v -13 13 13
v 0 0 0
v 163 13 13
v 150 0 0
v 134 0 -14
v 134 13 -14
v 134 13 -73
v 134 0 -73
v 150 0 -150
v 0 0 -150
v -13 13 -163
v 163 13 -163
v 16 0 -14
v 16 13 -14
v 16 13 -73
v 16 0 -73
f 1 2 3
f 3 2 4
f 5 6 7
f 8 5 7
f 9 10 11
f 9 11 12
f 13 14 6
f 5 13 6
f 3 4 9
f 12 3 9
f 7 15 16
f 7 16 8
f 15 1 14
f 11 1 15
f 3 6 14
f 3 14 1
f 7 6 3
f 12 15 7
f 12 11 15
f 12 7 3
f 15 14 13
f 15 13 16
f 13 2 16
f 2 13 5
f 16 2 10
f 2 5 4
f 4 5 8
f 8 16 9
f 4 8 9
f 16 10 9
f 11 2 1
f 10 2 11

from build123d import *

# Parameters (mm, degrees)
SKETCH1_W           = 150
SKETCH1_H           = 150
BOSS_EXTRUDE1_DEPTH = 13
BOSS_EXTRUDE1_DRAFT = -45
SKETCH2_W           = 118
SKETCH2_H           = 59
CUT_EXTRUDE1_DEPTH  = 13


with BuildPart() as part:
    # Sketch1 → Boss-Extrude1 (with draft: the straight prism first)
    with BuildSketch(Plane(origin=(0, 0, 0), x_dir=(1, 0, 0), z_dir=(0, 1, 0))):
        with Locations((75, 75)):
            Rectangle(SKETCH1_W, SKETCH1_H)
    extrude(amount=BOSS_EXTRUDE1_DEPTH)
    # Boss-Extrude1: the draft: its side faces are tilted about the plane it starts from
    boss_extrude1_sides = [part.faces().sort_by_distance(p)[0] for p in [
        (75, 6.5, 0),
        (150, 6.5, -75),
        (75, 6.5, -150),
        (0, 6.5, -75),
    ]]
    draft(boss_extrude1_sides, Plane(origin=(0, 0, 0), x_dir=(1, 0, 0), z_dir=(0, 1, 0)), BOSS_EXTRUDE1_DRAFT)

    # Sketch2 → Cut-Extrude1 (cut)
    with BuildSketch(Plane(origin=(0, 13, 0), x_dir=(1, 0, 0), z_dir=(0, 1, 0))):
        with Locations((75, 43.5)):
            Rectangle(SKETCH2_W, SKETCH2_H)
    extrude(amount=-CUT_EXTRUDE1_DEPTH, mode=Mode.SUBTRACT)


solid = part.part
